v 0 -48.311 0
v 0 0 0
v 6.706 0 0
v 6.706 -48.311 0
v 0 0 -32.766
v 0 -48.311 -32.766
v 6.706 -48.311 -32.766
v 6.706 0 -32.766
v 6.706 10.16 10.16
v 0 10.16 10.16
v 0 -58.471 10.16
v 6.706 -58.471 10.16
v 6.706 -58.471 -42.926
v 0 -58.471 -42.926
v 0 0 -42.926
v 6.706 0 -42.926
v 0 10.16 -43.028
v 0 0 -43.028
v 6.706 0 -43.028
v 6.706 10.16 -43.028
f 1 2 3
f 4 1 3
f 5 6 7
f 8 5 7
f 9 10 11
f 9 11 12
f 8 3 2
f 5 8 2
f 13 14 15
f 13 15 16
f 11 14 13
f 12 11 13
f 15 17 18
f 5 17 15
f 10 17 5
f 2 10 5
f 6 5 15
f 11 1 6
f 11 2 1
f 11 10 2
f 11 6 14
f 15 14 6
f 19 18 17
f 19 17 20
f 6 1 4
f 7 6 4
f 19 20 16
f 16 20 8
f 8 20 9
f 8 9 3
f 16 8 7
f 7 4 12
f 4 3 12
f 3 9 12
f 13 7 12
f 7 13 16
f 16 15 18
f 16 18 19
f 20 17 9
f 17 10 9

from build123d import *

# Parameters (mm, degrees)
F0_W     = 6.7056016997
F0_H     = 48.3108013868
F1_DEPTH = 10.16
F2_W     = 6.7056016997
F2_H     = 43.0277371144
F3_DEPTH = 10.16
F4_W     = 6.7056016997
F4_H     = 42.9259994364
F5_DEPTH = 10.16
F6_W     = 6.7056016997
F6_H     = 58.4708013868
F7_DEPTH = 10.16
F8_W     = 6.7056016997
F8_H     = 10.16
F9_DEPTH = 10.16


with BuildPart() as f1:
    # F0 (on Top) → F1 (new body)
    with BuildSketch(Plane.XY):
        with Locations((3.3528008498, -24.1554006934)):
            Rectangle(F0_W, F0_H)
    extrude(amount=F1_DEPTH)

    # F2 (on face) → F3 (join)
    with BuildSketch(Plane(origin=(0, 0, 0), x_dir=(-1, 0, 0), z_dir=(0, 1, 0))):
        with Locations((-3.3528008498, -11.3538685572)):
            Rectangle(F2_W, F2_H)
    extrude(amount=F3_DEPTH)

    # F4 (on face) → F5 (join)
    with BuildSketch(Plane.XZ.offset(48.3108013868)):
        with Locations((3.3528008498, -11.3029997182)):
            Rectangle(F4_W, F4_H)
    extrude(amount=F5_DEPTH)

    # F6 (on face) → F7 (join)
    with BuildSketch(Plane(origin=(0, 0, -32.7659994364), x_dir=(1, 0, 0), z_dir=(0, 0, -1))):
        with Locations((3.3528008498, 29.2354006934)):
            Rectangle(F6_W, F6_H)
    extrude(amount=F7_DEPTH)

    # F8 (on face) → F9 (join)
    with BuildSketch(Plane(origin=(0, 0, -32.8677371144), x_dir=(1, 0, 0), z_dir=(0, 0, -1))):
        with Locations((3.3528008498, -5.08)):
            Rectangle(F8_W, F8_H)
    extrude(amount=F9_DEPTH)


solid = f1.part
